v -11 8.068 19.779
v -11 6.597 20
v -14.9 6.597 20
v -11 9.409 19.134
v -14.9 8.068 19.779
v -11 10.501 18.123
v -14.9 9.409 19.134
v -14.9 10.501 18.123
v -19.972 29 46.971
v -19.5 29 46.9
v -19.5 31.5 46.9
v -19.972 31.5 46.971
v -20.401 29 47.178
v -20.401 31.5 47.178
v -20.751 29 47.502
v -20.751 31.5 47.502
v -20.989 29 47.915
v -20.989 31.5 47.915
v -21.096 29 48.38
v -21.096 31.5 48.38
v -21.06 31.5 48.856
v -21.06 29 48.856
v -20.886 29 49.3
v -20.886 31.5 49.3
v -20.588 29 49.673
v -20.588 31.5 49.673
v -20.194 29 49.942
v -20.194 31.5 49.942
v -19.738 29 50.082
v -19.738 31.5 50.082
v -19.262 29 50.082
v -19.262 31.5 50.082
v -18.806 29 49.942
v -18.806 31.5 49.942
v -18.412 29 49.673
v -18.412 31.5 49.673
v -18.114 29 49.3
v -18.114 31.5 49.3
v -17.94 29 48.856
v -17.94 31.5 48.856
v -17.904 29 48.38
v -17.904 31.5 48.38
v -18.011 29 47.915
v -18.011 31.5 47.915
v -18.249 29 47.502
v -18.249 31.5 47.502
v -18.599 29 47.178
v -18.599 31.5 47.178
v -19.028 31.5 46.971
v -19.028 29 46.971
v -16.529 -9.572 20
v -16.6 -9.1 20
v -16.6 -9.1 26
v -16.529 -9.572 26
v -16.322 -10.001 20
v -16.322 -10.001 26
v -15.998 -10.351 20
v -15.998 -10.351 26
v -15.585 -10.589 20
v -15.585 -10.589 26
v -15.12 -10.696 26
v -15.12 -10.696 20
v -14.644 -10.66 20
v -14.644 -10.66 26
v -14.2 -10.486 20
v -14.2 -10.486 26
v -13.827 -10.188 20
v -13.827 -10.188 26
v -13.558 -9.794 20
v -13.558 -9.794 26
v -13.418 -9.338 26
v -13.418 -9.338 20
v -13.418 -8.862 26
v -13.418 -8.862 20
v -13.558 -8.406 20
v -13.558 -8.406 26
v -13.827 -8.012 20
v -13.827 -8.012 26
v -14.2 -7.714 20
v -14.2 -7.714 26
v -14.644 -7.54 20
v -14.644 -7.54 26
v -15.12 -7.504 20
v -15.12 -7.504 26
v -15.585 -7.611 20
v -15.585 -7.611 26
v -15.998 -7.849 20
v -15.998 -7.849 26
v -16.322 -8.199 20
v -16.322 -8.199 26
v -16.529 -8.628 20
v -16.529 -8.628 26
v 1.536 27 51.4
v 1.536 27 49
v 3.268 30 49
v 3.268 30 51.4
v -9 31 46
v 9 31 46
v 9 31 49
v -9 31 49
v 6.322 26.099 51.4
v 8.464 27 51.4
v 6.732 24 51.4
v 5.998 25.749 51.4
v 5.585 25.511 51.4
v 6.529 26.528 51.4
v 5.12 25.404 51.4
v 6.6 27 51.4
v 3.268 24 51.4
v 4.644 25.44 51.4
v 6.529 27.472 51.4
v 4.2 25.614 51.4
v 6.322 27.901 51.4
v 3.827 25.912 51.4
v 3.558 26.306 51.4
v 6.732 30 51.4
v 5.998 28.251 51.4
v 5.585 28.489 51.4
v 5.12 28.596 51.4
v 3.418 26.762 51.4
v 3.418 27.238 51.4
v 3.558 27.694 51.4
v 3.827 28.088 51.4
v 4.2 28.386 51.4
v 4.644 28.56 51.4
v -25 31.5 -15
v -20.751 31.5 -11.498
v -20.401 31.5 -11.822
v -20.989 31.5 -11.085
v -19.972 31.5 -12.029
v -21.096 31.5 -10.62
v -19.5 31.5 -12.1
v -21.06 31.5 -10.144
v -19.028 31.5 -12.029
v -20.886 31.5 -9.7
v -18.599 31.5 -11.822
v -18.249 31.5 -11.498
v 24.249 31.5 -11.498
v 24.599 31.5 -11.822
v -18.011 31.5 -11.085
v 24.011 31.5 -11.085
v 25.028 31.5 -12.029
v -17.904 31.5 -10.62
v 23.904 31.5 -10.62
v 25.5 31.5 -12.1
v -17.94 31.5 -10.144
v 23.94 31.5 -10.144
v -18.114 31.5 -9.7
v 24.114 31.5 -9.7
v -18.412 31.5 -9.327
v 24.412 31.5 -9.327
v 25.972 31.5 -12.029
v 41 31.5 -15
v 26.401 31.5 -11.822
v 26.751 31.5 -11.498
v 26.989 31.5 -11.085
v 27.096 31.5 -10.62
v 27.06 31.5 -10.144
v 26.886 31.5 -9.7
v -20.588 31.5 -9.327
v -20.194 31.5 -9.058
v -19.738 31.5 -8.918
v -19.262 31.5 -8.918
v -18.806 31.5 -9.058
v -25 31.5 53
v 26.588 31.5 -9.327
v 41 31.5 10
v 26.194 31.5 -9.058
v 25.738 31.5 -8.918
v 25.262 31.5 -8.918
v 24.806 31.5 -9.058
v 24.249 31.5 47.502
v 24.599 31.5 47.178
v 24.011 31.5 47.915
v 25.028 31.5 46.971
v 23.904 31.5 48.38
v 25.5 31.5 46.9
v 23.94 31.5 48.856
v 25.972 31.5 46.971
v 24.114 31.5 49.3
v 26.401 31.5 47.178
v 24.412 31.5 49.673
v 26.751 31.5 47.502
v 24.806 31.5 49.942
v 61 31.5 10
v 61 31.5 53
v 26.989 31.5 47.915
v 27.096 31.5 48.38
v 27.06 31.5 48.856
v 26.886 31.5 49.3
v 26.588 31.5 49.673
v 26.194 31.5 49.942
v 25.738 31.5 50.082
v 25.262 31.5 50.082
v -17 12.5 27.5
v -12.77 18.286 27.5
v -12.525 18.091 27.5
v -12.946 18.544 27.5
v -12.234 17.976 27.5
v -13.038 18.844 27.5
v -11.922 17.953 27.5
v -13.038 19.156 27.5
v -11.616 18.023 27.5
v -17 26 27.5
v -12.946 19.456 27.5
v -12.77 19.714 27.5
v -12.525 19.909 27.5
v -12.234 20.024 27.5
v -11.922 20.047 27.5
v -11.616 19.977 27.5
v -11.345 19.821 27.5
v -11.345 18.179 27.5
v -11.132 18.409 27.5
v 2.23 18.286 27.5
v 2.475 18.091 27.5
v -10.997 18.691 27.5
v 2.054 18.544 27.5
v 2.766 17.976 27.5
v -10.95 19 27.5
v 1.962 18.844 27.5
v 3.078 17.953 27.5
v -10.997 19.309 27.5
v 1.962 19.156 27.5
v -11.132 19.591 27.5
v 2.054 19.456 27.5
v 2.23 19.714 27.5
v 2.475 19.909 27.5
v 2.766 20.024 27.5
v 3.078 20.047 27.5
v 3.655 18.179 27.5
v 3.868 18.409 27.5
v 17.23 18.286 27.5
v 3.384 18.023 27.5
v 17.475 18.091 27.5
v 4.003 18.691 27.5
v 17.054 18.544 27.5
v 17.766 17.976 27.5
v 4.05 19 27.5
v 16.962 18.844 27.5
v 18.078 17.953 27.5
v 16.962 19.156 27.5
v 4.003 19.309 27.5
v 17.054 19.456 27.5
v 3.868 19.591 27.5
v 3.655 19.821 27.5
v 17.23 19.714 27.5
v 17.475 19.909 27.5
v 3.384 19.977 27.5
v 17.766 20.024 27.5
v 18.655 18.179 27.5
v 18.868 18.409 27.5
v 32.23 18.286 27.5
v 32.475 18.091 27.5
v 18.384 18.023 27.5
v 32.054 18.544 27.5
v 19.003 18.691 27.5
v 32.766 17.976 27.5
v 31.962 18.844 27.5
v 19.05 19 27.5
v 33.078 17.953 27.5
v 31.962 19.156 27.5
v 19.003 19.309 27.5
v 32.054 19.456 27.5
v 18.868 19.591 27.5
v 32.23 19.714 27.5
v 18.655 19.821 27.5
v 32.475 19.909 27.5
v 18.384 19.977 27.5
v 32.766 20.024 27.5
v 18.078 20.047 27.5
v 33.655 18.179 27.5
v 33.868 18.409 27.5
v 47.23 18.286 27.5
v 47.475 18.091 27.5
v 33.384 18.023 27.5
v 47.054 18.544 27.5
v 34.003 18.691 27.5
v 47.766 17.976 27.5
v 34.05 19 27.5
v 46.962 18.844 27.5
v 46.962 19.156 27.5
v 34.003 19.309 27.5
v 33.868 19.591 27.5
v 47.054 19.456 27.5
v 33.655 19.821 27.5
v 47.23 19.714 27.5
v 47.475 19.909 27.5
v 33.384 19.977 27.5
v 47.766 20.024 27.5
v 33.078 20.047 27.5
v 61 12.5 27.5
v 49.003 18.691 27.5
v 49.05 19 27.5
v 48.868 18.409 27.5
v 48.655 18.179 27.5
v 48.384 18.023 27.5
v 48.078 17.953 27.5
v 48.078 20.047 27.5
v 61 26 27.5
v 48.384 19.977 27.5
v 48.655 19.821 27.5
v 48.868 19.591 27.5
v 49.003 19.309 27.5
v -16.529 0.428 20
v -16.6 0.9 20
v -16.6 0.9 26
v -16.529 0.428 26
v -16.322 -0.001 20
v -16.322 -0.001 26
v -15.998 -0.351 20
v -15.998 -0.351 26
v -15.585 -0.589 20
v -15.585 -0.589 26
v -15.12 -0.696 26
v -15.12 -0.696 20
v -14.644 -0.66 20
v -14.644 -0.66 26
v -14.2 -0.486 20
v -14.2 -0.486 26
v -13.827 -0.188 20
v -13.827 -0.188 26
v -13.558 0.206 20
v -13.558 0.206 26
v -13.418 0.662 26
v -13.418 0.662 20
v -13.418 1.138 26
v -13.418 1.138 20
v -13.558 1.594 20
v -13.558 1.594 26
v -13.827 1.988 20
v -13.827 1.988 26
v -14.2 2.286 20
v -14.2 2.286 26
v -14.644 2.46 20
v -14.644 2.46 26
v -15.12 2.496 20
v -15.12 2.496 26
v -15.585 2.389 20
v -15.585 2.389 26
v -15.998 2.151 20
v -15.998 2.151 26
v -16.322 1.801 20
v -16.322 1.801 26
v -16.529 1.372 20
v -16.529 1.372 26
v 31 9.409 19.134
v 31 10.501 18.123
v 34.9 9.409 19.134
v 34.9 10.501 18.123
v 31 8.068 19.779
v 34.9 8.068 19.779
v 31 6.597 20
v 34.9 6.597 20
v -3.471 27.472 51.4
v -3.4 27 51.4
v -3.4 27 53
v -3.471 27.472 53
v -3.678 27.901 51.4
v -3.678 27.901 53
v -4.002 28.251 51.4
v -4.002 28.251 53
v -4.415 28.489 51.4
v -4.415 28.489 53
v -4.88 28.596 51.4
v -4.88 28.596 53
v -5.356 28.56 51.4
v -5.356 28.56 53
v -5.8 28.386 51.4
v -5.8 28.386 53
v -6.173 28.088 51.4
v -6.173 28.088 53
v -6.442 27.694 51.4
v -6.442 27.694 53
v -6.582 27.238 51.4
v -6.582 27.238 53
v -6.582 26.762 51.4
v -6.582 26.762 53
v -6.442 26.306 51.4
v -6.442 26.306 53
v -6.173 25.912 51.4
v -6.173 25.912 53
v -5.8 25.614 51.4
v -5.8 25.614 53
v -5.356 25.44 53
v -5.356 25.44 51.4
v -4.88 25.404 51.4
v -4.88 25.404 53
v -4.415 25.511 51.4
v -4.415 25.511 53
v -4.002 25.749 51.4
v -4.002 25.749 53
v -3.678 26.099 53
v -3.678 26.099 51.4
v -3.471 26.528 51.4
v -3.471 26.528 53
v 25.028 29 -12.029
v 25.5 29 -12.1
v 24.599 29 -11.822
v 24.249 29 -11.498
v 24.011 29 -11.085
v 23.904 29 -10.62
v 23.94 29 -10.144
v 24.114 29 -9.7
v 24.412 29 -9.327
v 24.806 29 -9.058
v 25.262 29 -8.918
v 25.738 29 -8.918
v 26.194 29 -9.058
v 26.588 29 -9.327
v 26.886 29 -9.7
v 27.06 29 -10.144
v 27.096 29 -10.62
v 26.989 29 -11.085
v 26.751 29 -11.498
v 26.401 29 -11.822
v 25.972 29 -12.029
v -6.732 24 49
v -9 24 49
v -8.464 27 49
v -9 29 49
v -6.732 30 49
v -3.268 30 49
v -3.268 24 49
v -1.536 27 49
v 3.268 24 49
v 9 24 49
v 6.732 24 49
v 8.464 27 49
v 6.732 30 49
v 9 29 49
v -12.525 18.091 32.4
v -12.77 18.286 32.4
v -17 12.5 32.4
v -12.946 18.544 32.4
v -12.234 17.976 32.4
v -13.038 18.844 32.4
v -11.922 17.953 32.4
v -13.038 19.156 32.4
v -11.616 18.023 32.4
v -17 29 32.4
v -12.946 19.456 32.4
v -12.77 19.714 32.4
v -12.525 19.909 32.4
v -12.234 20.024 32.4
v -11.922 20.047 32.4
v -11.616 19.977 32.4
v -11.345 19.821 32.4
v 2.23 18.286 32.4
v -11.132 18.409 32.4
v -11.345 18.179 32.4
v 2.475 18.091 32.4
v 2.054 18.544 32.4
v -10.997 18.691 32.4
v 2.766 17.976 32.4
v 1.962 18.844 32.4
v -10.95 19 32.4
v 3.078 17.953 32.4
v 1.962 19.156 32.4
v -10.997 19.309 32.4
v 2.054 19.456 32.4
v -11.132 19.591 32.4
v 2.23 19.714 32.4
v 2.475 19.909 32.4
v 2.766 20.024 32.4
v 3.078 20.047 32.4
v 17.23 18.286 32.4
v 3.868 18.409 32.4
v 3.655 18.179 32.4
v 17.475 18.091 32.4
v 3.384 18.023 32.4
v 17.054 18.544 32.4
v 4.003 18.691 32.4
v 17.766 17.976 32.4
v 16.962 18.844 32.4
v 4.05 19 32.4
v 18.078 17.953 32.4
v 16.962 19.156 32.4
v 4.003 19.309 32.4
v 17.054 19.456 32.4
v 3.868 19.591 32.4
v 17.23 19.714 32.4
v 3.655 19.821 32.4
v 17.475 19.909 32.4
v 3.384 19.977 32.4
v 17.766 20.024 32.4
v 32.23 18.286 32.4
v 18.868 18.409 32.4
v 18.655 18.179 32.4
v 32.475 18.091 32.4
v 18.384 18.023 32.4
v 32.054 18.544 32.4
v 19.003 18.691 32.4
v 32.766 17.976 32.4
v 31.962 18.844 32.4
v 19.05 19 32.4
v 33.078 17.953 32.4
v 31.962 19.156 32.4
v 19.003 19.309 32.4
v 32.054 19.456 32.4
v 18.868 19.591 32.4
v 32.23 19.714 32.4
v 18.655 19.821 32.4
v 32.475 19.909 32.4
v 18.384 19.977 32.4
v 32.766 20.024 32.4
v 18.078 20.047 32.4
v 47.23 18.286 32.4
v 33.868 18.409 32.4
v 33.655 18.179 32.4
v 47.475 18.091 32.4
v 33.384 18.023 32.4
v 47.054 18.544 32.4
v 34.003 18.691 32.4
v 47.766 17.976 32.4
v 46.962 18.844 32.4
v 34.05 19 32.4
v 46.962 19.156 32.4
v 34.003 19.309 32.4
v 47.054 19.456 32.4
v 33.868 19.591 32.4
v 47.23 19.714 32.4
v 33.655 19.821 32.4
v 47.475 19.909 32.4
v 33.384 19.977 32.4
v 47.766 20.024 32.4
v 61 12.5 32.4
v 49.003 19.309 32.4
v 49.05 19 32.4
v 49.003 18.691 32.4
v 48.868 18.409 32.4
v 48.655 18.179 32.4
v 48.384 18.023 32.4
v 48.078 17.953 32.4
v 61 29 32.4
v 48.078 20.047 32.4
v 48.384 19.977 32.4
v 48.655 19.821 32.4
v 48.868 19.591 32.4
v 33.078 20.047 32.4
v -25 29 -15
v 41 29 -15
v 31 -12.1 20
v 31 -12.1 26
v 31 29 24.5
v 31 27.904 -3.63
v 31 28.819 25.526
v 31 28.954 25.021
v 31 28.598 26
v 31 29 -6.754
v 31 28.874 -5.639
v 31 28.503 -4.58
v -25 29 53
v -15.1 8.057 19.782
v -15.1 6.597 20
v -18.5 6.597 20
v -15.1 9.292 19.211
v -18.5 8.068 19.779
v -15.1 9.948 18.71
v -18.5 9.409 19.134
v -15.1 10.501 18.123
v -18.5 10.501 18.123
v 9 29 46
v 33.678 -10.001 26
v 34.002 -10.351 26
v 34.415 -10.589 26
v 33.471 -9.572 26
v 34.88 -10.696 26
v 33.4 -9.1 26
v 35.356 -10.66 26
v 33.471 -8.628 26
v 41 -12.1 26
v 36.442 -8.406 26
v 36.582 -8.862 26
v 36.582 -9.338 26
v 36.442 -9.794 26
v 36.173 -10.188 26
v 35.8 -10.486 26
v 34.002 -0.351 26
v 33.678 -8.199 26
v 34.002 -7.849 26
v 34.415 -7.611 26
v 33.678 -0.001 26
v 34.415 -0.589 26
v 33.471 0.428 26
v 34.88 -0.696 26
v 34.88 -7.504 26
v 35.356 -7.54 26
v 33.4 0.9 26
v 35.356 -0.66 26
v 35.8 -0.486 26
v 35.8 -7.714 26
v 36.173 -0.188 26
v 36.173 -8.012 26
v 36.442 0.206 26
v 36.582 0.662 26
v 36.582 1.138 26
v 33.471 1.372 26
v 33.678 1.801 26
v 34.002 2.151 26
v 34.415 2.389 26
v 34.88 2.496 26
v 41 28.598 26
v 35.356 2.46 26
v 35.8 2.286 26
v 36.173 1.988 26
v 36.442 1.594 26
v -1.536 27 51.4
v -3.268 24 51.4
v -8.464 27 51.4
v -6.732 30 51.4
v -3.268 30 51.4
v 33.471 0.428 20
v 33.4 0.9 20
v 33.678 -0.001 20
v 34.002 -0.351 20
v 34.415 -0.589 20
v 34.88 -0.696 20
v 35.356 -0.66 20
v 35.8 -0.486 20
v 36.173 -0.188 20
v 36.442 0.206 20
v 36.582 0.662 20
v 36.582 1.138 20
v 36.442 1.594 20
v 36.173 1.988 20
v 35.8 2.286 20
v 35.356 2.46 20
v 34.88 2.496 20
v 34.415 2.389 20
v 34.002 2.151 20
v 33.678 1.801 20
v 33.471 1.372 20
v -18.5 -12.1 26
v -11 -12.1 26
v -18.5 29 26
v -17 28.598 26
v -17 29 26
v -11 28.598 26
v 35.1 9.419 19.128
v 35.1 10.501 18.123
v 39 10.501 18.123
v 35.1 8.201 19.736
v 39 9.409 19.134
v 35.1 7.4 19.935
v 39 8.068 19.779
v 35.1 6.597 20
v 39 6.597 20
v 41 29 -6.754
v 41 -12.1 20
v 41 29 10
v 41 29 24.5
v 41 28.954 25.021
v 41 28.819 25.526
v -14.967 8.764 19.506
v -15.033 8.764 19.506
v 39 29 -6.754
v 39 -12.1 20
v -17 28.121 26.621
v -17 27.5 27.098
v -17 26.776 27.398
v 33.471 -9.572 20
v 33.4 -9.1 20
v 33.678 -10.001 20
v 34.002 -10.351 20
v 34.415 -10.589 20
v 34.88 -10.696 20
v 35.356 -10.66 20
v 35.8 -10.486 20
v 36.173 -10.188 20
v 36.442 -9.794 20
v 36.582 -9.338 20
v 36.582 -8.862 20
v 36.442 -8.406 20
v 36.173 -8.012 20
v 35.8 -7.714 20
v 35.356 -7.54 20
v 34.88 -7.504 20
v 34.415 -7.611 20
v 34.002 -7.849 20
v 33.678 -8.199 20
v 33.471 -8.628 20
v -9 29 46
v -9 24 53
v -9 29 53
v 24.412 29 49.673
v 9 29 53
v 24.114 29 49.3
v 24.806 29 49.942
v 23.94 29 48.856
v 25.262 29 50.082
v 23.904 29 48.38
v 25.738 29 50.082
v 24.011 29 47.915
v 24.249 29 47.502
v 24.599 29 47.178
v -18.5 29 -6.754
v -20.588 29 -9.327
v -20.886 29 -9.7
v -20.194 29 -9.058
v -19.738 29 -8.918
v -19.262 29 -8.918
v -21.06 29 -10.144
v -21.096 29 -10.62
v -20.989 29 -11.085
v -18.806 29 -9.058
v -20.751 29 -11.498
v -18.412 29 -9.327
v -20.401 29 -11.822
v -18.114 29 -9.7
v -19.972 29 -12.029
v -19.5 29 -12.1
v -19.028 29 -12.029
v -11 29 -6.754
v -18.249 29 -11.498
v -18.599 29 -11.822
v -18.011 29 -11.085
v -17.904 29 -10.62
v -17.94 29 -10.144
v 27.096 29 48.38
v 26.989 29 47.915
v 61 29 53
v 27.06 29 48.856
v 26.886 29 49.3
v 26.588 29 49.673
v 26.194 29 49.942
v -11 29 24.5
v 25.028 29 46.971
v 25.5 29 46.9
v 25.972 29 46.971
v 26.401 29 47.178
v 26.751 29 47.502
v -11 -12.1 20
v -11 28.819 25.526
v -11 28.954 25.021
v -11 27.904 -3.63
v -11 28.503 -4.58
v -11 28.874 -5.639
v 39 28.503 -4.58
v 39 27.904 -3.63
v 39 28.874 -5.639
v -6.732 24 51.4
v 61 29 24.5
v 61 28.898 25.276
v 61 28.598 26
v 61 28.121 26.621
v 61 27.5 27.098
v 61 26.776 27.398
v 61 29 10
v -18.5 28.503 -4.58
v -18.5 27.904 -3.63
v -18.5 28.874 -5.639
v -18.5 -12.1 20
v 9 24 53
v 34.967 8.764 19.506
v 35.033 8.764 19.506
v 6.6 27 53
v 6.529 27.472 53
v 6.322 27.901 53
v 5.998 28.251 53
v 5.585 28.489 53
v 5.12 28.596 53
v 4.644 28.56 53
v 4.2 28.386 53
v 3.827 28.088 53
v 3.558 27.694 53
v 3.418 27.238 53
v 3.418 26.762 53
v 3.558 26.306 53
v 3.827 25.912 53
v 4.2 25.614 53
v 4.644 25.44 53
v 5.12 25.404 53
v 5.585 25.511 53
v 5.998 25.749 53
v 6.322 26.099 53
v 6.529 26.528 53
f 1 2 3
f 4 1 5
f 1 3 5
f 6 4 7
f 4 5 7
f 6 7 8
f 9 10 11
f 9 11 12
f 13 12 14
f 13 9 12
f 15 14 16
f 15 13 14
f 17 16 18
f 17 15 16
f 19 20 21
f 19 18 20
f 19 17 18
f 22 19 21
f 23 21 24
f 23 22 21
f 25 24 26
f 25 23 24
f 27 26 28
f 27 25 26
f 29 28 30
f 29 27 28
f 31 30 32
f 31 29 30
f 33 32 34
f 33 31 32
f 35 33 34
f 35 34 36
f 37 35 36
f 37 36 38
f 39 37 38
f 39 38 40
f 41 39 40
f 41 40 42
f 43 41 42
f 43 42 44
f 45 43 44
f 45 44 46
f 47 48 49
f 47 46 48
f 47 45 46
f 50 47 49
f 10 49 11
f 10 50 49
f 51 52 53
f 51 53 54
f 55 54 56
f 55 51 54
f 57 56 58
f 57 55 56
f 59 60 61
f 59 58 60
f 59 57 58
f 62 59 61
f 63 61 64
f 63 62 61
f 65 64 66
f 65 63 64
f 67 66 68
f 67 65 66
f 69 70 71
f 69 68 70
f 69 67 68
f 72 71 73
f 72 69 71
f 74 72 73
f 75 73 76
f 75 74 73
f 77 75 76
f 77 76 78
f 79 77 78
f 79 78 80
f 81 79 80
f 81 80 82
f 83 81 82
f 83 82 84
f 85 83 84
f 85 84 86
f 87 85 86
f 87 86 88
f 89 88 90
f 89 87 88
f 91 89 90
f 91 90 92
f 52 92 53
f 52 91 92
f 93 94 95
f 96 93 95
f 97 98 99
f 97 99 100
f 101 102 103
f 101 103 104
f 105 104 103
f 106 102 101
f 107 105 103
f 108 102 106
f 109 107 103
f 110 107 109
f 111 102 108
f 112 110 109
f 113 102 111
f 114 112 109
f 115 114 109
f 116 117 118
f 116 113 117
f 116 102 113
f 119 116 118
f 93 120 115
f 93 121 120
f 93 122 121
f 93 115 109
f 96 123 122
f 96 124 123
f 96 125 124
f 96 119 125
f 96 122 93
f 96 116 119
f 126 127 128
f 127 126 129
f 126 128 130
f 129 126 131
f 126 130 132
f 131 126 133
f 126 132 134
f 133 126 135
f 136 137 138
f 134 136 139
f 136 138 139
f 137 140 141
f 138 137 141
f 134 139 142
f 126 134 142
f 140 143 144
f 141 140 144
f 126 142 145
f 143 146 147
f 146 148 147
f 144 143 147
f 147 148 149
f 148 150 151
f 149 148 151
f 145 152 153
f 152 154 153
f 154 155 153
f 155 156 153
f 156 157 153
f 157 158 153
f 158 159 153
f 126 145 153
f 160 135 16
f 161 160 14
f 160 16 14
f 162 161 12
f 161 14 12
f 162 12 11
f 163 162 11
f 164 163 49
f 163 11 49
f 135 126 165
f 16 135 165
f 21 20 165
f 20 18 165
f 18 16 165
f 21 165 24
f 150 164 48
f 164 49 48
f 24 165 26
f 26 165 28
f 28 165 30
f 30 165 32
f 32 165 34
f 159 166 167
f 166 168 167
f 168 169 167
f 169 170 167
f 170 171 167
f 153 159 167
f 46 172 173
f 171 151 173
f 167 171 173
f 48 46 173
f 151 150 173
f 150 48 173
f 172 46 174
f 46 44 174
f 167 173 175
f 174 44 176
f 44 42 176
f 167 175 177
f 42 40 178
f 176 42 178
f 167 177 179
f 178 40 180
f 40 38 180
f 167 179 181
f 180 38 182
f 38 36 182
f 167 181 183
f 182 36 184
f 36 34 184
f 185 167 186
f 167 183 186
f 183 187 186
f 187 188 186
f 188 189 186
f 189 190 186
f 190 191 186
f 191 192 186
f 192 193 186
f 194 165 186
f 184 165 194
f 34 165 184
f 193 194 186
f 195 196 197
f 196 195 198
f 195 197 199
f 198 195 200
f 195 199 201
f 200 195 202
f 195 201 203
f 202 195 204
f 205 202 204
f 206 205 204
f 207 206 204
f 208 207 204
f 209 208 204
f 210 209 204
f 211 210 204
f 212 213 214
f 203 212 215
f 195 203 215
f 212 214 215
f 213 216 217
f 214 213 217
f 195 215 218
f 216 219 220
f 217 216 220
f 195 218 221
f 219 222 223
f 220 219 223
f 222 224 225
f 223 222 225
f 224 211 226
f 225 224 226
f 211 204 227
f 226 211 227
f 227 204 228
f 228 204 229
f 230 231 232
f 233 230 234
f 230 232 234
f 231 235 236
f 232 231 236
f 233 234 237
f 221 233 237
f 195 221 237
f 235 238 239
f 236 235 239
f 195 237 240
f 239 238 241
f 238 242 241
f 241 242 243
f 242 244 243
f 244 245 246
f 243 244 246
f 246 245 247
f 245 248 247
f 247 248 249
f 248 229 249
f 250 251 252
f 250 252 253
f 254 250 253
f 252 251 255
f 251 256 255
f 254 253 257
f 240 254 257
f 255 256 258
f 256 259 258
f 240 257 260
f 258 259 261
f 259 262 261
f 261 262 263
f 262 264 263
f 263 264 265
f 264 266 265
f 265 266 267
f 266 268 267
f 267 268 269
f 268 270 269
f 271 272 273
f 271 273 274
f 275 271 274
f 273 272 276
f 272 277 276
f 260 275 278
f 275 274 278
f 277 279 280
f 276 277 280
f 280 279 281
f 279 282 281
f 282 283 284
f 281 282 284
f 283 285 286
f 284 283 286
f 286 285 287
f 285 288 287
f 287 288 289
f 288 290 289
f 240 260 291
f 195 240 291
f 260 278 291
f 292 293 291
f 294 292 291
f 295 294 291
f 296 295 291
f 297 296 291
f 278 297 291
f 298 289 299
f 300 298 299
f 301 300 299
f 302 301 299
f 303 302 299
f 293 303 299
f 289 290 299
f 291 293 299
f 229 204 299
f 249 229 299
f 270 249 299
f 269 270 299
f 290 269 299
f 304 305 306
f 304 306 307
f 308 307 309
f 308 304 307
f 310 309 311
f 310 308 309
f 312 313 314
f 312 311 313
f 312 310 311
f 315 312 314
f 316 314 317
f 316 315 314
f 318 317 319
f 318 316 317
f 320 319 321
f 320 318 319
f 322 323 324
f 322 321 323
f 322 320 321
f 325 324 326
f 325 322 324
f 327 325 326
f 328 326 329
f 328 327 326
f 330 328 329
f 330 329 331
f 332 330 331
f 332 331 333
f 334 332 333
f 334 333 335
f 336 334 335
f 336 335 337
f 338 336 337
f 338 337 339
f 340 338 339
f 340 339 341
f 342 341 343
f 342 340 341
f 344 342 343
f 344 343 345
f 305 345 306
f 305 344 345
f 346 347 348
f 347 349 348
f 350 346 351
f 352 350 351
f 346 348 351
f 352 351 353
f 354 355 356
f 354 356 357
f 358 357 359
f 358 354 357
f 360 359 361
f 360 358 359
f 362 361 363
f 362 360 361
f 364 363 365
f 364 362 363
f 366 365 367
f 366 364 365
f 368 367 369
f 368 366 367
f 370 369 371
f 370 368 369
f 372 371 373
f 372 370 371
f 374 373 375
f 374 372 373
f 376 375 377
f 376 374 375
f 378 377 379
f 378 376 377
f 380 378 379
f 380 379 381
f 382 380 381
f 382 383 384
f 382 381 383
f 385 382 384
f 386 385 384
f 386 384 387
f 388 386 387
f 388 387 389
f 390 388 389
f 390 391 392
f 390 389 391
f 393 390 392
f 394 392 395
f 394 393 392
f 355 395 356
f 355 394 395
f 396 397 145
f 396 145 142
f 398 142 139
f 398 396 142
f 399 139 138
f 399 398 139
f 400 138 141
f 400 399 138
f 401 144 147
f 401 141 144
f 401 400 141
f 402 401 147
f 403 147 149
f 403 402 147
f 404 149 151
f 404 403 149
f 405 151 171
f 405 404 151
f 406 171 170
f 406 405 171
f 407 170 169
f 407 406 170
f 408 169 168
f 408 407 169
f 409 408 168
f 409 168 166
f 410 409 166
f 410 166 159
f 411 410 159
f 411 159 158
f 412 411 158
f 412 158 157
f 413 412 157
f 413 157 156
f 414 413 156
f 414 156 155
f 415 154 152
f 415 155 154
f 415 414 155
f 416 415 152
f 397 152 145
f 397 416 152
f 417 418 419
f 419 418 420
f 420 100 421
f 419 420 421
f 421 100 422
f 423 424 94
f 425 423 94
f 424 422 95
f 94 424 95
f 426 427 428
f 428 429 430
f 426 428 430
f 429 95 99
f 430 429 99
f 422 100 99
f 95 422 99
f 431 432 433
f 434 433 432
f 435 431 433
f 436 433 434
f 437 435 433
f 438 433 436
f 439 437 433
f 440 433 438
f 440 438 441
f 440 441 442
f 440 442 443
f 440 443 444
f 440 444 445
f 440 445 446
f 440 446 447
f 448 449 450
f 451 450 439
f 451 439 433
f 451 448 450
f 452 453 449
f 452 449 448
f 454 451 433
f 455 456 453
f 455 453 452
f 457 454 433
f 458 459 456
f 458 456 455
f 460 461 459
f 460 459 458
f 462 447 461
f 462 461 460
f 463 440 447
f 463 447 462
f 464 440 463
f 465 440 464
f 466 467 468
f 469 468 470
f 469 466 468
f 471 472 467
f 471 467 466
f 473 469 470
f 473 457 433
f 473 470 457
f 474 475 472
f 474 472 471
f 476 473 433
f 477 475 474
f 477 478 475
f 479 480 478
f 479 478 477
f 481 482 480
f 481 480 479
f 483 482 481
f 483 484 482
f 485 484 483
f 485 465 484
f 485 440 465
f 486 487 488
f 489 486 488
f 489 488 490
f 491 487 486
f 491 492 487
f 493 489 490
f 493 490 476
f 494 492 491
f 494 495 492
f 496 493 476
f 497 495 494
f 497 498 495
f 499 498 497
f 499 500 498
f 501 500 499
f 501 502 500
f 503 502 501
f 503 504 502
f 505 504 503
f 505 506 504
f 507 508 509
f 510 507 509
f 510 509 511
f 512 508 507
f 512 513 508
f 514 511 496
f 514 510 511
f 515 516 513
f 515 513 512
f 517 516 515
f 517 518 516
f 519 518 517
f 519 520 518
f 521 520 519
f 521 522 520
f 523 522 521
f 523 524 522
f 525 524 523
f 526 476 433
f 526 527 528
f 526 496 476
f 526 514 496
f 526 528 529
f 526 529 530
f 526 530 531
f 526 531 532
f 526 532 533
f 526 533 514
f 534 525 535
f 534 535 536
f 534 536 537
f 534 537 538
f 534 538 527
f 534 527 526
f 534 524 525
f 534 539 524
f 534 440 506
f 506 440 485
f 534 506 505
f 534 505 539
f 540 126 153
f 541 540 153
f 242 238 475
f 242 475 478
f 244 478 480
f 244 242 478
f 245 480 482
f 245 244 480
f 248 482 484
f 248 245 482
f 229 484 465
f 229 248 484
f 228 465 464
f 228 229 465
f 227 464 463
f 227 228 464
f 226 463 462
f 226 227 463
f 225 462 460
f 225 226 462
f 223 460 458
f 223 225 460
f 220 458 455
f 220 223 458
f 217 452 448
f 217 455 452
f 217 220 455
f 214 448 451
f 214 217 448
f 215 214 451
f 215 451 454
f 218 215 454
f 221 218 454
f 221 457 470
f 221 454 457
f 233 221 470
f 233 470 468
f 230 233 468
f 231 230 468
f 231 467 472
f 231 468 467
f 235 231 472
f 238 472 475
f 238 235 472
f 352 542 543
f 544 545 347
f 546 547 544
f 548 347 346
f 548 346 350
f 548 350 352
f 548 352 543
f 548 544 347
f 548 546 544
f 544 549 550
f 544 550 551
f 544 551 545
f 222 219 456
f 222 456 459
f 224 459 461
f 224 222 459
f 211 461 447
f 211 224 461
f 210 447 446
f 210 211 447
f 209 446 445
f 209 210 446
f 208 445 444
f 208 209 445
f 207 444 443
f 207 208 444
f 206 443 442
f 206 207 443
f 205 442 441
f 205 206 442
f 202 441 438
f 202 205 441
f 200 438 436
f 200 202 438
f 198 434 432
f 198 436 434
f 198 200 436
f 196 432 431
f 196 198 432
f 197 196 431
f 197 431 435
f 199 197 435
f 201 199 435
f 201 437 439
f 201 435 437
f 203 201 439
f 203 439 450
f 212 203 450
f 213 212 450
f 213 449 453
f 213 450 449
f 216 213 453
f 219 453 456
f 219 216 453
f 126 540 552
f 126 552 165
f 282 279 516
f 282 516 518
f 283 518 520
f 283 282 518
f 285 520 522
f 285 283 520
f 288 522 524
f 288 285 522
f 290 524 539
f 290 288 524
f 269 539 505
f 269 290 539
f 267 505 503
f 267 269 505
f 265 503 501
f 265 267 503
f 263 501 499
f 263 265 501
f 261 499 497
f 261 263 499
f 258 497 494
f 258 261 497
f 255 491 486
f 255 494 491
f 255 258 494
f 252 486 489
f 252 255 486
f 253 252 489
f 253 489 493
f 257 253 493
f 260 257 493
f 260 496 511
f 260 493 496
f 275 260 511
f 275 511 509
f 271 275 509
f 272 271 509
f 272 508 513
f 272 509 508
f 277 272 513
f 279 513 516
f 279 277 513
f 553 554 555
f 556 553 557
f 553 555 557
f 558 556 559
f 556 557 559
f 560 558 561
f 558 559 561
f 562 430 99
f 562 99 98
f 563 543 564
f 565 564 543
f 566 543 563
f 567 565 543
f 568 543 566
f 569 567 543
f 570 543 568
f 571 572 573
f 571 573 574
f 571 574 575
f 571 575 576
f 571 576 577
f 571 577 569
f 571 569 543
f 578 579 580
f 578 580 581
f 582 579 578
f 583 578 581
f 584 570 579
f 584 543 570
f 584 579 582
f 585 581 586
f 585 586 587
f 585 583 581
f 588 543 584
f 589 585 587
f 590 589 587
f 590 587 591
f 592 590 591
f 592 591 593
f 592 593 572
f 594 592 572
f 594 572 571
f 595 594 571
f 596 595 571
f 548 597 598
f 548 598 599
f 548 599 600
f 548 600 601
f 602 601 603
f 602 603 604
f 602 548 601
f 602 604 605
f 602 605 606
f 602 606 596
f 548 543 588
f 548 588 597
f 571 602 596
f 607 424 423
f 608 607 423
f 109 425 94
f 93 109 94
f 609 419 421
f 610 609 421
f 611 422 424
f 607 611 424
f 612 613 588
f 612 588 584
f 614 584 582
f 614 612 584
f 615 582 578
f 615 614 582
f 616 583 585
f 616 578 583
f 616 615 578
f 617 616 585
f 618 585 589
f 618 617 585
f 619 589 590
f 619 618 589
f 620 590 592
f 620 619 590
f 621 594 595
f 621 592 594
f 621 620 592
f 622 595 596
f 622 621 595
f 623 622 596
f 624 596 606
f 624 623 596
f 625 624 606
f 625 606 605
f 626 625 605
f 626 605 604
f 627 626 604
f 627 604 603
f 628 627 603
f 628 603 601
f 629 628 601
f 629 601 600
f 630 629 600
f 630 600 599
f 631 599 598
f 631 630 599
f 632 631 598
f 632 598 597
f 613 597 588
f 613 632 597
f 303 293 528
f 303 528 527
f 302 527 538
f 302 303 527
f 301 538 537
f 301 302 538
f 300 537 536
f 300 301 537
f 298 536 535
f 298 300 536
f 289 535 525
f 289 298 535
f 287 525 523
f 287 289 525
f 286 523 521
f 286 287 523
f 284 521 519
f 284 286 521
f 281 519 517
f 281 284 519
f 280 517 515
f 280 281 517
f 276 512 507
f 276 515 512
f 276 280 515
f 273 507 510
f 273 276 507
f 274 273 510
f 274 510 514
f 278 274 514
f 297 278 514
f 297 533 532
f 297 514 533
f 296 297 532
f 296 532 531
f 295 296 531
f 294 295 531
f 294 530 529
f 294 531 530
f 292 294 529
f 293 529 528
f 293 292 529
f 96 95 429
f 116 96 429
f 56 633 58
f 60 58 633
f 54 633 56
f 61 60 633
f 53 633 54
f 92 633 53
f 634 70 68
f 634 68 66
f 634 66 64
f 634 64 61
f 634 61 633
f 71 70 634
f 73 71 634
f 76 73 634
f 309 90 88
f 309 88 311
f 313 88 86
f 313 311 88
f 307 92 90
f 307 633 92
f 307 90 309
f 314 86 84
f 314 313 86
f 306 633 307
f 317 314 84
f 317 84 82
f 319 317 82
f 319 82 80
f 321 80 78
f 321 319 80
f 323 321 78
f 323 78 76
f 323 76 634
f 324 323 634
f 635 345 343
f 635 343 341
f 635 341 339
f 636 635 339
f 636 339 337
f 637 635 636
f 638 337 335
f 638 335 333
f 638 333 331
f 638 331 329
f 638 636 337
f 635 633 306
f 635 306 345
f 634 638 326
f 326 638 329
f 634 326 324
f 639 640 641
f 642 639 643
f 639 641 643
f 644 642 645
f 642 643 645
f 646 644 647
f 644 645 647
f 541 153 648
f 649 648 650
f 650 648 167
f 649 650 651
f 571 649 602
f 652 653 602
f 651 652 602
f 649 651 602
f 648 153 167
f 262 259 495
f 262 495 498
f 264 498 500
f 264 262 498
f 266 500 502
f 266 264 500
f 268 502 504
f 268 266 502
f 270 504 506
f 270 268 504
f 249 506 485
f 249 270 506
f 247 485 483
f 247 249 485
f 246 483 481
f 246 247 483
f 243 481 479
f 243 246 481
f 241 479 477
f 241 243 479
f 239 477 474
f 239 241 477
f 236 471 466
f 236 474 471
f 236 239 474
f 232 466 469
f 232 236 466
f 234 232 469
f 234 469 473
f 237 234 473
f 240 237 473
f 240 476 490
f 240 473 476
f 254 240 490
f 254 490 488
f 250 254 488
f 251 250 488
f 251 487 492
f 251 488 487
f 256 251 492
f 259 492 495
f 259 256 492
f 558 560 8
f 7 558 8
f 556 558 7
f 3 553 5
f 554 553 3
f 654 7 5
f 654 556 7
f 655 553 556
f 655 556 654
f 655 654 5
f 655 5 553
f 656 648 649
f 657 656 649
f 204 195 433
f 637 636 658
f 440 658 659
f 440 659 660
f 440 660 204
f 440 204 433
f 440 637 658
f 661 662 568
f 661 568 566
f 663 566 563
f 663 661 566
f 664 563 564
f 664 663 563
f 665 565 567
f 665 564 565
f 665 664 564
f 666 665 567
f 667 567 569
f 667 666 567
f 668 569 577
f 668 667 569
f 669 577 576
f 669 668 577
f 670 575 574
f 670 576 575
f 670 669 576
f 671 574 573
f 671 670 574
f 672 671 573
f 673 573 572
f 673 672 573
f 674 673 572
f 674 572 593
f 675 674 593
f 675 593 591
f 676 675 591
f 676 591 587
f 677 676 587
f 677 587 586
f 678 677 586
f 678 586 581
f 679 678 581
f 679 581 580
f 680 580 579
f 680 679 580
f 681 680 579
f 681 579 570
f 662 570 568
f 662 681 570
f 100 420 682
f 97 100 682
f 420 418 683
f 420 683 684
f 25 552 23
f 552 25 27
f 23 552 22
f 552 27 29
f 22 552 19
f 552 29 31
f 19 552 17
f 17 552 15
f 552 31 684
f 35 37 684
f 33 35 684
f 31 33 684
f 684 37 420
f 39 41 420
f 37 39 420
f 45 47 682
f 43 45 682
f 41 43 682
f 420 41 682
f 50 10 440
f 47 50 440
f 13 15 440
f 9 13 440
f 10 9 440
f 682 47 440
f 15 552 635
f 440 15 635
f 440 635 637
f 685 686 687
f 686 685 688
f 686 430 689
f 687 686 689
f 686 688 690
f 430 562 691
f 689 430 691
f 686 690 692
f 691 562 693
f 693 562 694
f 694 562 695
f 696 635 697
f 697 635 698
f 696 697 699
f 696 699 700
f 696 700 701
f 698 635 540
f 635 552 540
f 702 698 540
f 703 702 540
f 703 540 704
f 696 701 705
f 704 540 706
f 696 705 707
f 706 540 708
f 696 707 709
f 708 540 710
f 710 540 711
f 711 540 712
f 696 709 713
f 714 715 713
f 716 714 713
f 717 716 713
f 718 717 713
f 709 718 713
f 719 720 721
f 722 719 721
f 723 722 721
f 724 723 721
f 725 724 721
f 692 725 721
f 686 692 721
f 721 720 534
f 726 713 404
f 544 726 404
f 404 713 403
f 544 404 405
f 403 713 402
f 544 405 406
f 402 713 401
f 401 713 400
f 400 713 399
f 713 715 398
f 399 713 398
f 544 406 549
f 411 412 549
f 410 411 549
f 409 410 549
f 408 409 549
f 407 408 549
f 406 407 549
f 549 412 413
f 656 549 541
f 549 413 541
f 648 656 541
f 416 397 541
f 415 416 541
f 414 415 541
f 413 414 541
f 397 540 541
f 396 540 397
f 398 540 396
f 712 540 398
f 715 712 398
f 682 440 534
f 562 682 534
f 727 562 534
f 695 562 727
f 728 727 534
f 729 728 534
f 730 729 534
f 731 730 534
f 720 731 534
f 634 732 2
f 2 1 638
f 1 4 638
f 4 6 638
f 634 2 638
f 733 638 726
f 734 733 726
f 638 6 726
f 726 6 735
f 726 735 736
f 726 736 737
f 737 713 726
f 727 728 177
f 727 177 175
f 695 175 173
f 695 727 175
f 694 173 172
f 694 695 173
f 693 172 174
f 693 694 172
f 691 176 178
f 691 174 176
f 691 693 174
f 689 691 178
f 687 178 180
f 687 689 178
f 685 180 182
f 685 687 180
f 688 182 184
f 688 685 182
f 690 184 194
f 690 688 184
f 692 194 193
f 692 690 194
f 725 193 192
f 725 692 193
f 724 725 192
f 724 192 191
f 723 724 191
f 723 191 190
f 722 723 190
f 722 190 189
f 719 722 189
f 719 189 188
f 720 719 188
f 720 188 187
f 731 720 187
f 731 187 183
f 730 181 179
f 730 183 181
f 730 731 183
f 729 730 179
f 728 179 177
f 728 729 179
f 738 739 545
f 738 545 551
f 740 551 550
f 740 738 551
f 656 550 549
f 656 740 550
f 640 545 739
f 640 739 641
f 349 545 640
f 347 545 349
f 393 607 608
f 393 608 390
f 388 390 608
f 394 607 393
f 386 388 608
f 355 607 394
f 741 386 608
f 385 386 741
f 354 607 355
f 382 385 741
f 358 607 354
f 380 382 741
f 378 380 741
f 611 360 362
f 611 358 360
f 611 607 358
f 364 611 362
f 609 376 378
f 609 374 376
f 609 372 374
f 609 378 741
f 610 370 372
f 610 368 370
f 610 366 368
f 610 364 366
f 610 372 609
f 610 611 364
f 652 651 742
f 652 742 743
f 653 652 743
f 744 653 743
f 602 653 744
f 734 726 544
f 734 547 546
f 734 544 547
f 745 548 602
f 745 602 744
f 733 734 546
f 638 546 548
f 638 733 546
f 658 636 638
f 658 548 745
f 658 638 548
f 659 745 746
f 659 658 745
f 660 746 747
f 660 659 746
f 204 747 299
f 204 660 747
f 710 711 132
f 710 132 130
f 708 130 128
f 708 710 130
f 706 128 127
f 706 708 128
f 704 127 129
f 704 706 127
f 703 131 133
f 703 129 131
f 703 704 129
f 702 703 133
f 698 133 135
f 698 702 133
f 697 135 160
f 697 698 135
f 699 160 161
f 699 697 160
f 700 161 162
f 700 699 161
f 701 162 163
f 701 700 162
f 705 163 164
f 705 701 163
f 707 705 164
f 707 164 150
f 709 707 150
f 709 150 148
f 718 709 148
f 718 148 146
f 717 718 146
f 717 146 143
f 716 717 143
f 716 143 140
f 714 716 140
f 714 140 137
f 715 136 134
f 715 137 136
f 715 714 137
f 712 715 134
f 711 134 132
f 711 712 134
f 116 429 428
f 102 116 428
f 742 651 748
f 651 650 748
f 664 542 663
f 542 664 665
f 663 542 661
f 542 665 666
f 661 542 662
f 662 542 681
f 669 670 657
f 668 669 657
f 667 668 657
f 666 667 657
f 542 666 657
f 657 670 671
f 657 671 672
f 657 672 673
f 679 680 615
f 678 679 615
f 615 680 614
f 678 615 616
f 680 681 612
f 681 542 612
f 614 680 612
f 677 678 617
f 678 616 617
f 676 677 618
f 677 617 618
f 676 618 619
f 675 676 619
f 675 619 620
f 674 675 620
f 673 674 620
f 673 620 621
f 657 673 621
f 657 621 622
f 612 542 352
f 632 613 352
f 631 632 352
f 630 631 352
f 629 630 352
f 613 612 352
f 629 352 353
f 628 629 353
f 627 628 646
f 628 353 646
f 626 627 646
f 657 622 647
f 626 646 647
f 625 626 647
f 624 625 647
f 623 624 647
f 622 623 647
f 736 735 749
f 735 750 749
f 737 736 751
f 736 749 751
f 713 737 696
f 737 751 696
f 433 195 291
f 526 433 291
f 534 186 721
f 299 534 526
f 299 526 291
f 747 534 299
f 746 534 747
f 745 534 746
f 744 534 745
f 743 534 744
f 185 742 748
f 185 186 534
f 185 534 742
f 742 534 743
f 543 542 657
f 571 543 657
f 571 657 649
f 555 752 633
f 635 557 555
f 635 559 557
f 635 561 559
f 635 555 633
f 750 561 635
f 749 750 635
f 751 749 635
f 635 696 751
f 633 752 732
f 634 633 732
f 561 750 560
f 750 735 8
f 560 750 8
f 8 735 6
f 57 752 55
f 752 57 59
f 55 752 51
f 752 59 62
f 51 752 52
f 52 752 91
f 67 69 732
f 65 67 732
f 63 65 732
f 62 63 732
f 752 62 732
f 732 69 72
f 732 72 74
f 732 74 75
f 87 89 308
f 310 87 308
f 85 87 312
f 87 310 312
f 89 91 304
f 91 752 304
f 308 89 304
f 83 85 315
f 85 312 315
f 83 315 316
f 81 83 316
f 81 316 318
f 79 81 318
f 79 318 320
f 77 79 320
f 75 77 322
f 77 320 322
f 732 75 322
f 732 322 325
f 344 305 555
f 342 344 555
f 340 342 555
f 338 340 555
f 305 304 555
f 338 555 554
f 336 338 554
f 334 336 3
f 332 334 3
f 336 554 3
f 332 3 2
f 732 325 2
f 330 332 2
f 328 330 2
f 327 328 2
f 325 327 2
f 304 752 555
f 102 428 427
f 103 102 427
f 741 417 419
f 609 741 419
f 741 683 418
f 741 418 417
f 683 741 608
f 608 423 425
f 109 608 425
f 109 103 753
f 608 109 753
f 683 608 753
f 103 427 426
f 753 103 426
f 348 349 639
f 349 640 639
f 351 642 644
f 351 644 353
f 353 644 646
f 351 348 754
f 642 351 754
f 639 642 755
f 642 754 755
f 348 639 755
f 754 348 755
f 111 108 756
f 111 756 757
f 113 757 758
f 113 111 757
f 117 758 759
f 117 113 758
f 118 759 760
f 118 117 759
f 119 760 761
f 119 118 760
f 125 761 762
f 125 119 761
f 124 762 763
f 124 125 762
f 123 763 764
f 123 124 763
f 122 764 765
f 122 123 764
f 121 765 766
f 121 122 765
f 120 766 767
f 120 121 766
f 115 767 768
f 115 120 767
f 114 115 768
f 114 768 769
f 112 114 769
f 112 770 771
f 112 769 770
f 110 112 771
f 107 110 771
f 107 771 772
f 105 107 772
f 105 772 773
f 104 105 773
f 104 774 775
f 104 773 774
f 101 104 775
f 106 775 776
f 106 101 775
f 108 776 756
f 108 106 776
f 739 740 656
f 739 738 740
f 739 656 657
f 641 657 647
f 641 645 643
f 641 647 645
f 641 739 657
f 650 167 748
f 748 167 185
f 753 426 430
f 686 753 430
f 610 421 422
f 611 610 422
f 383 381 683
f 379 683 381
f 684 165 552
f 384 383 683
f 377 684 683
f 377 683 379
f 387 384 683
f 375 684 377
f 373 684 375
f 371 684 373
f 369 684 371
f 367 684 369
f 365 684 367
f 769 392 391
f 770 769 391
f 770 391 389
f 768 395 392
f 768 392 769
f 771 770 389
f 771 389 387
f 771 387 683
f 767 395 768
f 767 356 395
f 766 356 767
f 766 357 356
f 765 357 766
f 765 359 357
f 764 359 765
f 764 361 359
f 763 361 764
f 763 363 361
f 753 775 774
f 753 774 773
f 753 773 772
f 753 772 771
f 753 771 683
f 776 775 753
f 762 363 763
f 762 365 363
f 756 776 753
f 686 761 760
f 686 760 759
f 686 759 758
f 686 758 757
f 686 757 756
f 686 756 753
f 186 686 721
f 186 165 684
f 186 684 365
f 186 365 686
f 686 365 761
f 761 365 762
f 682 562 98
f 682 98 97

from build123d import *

# Parameters (mm, degrees)
ORTHOGONAL_START                              = -15
ORTHOGONAL_CHASSIS_PLATE_PRIMARY_PROFILE_W    = 66
ORTHOGONAL_CHASSIS_PLATE_PRIMARY_PROFILE_H    = 4
ORTHOGONAL_CHASSIS_PLATE_PRIMARY_DEPTH        = 25.1
ORTHOGONAL_START_2                            = 10
ORTHOGONAL_CHASSIS_PLATE_GUIDE_SIDE_PROF_W    = 109
ORTHOGONAL_CHASSIS_PLATE_GUIDE_SIDE_PROF_H    = 4
ORTHOGONAL_CHASSIS_PLATE_GUIDE_SIDE_DEPTH     = 43
HORIZONTAL_START                              = 20
HORIZONTAL_SERVO_SEAT_UPRIGHTS_PROFILE_W      = 7.5
HORIZONTAL_SERVO_SEAT_UPRIGHTS_PROFILE_H      = 37.1
HORIZONTAL_SERVO_SEAT_UPRIGHTS_PROFILE_W_2    = 10
HORIZONTAL_SERVO_SEAT_UPRIGHTS_DEPTH          = 6
SIDE_START                                    = 27.5
SIDE_MOUNTING_FACE_FOR_MGN7_RAIL_PROFILE_W    = 100
SIDE_MOUNTING_FACE_FOR_MGN7_RAIL_PROFILE_H    = 16.6
SIDE_MOUNTING_FACE_FOR_MGN7_RAIL_DEPTH        = 4.9
HORIZONTAL_START_2                            = 49
HORIZONTAL_LIMIT_BRACKET_FOOT_SUPPORT_PR_W    = 18
HORIZONTAL_LIMIT_BRACKET_FOOT_SUPPORT_PR_H    = 5.1
HORIZONTAL_LIMIT_BRACKET_FOOT_SUPPORT_DEPTH   = 4
CHASSIS_START                                 = 28.9
CHASSIS_MOUNTING_HOLE_LAYOUT_45_X_41_2_R      = 1.6
CHASSIS_MOUNTING_HOLE_LAYOUT_45_X_41_MM_DEPTH = 4.2
SERVO_START                                   = 19.9
SERVO_MOUNT_50_X_10_MM_PITCH_PROFILE_R        = 1.6
SERVO_MOUNT_50_X_10_MM_PITCH_DEPTH            = 6.2
GUIDE_START                                   = 27.45
GUIDE_M2_MOUNTING_PILOTS_15_MM_PITCH_PRO_R    = 1.05
GUIDE_M2_MOUNTING_PILOTS_15_MM_PITCH_DEPTH    = 5.05
STOP_START                                    = 48.9
STOP_MOUNTING_TWO_M3_PILOTS_10_MM_PI_2_R      = 1.6
STOP_MOUNTING_TWO_M3_PILOTS_10_MM_PITCH_DEPTH = 4.2
FILLET_2_R                                    = 3
SKETCH_3_W                                    = 18
SKETCH_3_H                                    = 3
CUT_EXTRUDE_1_DEPTH                           = 2
CUT_EXTRUDE_2_DEPTH                           = 2.4
EXTRUDE_3_DEPTH                               = 7.5
EXTRUDE_4_DEPTH                               = 10
FILLET_3_R                                    = 5
SKETCH_7_W                                    = 109
SKETCH_7_H                                    = 1.5
CUT_EXTRUDE_3_DEPTH                           = 80
SKETCH_8_W                                    = 23
SKETCH_8_H                                    = 43
CUT_EXTRUDE_4_DEPTH                           = 30
RAISE_START                                   = 20
RAISE_SERVO_MOUNTING_TABS_BY_4_10_MM_PRO_W    = 7.5
RAISE_SERVO_MOUNTING_TABS_BY_4_10_MM_PRO_H    = 5.1
RAISE_SERVO_MOUNTING_TABS_BY_4_10_MM_PRO_W_2  = 10
RAISE_SERVO_MOUNTING_TABS_BY_4_10_MM_DEPTH    = 6
FILL_START                                    = 20
FILL_ORIGINAL_SERVO_HOLES_PROFILE_R           = 1.65
FILL_ORIGINAL_SERVO_HOLES_DEPTH               = 6
SERVO_MOUNTING_HOLES_RAISED_4_10_MM_PROF_R    = 1.6
SERVO_MOUNTING_HOLES_RAISED_4_10_MM_DEPTH     = 6.2
EXTRUDE_5_DEPTH                               = 2


with BuildPart() as part:
    # Orthogonal chassis plate primary profile → Orthogonal chassis plate primary (new body)
    with BuildSketch(Plane.XY.offset(ORTHOGONAL_START)):
        with Locations((8, 31)):
            Rectangle(ORTHOGONAL_CHASSIS_PLATE_PRIMARY_PROFILE_W, ORTHOGONAL_CHASSIS_PLATE_PRIMARY_PROFILE_H)
    extrude(amount=ORTHOGONAL_CHASSIS_PLATE_PRIMARY_DEPTH)

    # Orthogonal chassis plate guide side profile → Orthogonal chassis plate guide side (add)
    with BuildSketch(Plane.XY.offset(ORTHOGONAL_START_2)):
        with Locations((29.5, 31)):
            Rectangle(ORTHOGONAL_CHASSIS_PLATE_GUIDE_SIDE_PROF_W, ORTHOGONAL_CHASSIS_PLATE_GUIDE_SIDE_PROF_H)
    extrude(amount=ORTHOGONAL_CHASSIS_PLATE_GUIDE_SIDE_DEPTH)

    # Horizontal servo seat uprights profile → Horizontal servo seat uprights (add)
    with BuildSketch(Plane.XY.offset(HORIZONTAL_START)):
        with Locations((-14.75, 10.55)):
            Rectangle(HORIZONTAL_SERVO_SEAT_UPRIGHTS_PROFILE_W, HORIZONTAL_SERVO_SEAT_UPRIGHTS_PROFILE_H)
        with Locations((36, 10.55)):
            Rectangle(HORIZONTAL_SERVO_SEAT_UPRIGHTS_PROFILE_W_2, HORIZONTAL_SERVO_SEAT_UPRIGHTS_PROFILE_H)
    extrude(amount=HORIZONTAL_SERVO_SEAT_UPRIGHTS_DEPTH)

    # Side mounting face for MGN7 rail profile → Side mounting face for MGN7 rail (add)
    with BuildSketch(Plane.XY.offset(SIDE_START)):
        with Locations((33, 20.8)):
            Rectangle(SIDE_MOUNTING_FACE_FOR_MGN7_RAIL_PROFILE_W, SIDE_MOUNTING_FACE_FOR_MGN7_RAIL_PROFILE_H)
    extrude(amount=SIDE_MOUNTING_FACE_FOR_MGN7_RAIL_DEPTH)

    # Horizontal limit bracket foot support profile → Horizontal limit bracket foot support (add)
    with BuildSketch(Plane.XY.offset(HORIZONTAL_START_2)):
        with Locations((0, 26.55)):
            Rectangle(HORIZONTAL_LIMIT_BRACKET_FOOT_SUPPORT_PR_W, HORIZONTAL_LIMIT_BRACKET_FOOT_SUPPORT_PR_H)
    extrude(amount=HORIZONTAL_LIMIT_BRACKET_FOOT_SUPPORT_DEPTH)

    # Chassis mounting hole layout 45 x 41 2 → Chassis mounting hole layout 45 x 41 mm (cut)
    with BuildSketch(Plane(origin=(0, 0, 0), x_dir=(1, 0, 0), z_dir=(0, 1, 0)).offset(CHASSIS_START)):
        with Locations(Location((-19.5, 10.5, 0), (0, 0, 90))):
            Circle(CHASSIS_MOUNTING_HOLE_LAYOUT_45_X_41_2_R)
        with Locations(Location((-19.5, -48.5, 0), (0, 0, 90))):
            Circle(CHASSIS_MOUNTING_HOLE_LAYOUT_45_X_41_2_R)
        with Locations(Location((25.5, 10.5, 0), (0, 0, 90))):
            Circle(CHASSIS_MOUNTING_HOLE_LAYOUT_45_X_41_2_R)
        with Locations(Location((25.5, -48.5, 0), (0, 0, 90))):
            Circle(CHASSIS_MOUNTING_HOLE_LAYOUT_45_X_41_2_R)
        with Locations(Location((70.5, -48.5, 0), (0, 0, 90))):
            Circle(CHASSIS_MOUNTING_HOLE_LAYOUT_45_X_41_2_R)
    extrude(amount=CHASSIS_MOUNTING_HOLE_LAYOUT_45_X_41_MM_DEPTH, mode=Mode.SUBTRACT)

    # Servo mount 50 x 10 mm pitch profile → Servo mount 50 x 10 mm pitch (cut)
    with BuildSketch(Plane.XY.offset(SERVO_START)):
        with Locations(Location((-15, -5, 0), (0, 0, 180))):
            Circle(SERVO_MOUNT_50_X_10_MM_PITCH_PROFILE_R)
        with Locations(Location((-15, 5, 0), (0, 0, 180))):
            Circle(SERVO_MOUNT_50_X_10_MM_PITCH_PROFILE_R)
        with Locations(Location((35, -5, 0), (0, 0, 180))):
            Circle(SERVO_MOUNT_50_X_10_MM_PITCH_PROFILE_R)
        with Locations(Location((35, 5, 0), (0, 0, 180))):
            Circle(SERVO_MOUNT_50_X_10_MM_PITCH_PROFILE_R)
    extrude(amount=SERVO_MOUNT_50_X_10_MM_PITCH_DEPTH, mode=Mode.SUBTRACT)

    # Guide M2 mounting pilots 15 mm pitch profile → Guide M2 mounting pilots 15 mm pitch (cut)
    with BuildSketch(Plane.XY.offset(GUIDE_START)):
        with Locations((-12, 19)):
            Circle(GUIDE_M2_MOUNTING_PILOTS_15_MM_PITCH_PRO_R)
        with Locations((3, 19)):
            Circle(GUIDE_M2_MOUNTING_PILOTS_15_MM_PITCH_PRO_R)
        with Locations((18, 19)):
            Circle(GUIDE_M2_MOUNTING_PILOTS_15_MM_PITCH_PRO_R)
        with Locations((33, 19)):
            Circle(GUIDE_M2_MOUNTING_PILOTS_15_MM_PITCH_PRO_R)
        with Locations((48, 19)):
            Circle(GUIDE_M2_MOUNTING_PILOTS_15_MM_PITCH_PRO_R)
        with Locations((63, 19)):
            Circle(GUIDE_M2_MOUNTING_PILOTS_15_MM_PITCH_PRO_R)
        with Locations((78, 19)):
            Circle(GUIDE_M2_MOUNTING_PILOTS_15_MM_PITCH_PRO_R)
    extrude(amount=GUIDE_M2_MOUNTING_PILOTS_15_MM_PITCH_DEPTH, mode=Mode.SUBTRACT)

    # Stop mounting two M3 pilots 10 mm pi 2 → Stop mounting two M3 pilots 10 mm pitch (cut)
    with BuildSketch(Plane.XY.offset(STOP_START)):
        with Locations((-5, 27)):
            Circle(STOP_MOUNTING_TWO_M3_PILOTS_10_MM_PI_2_R)
        with Locations((5, 27)):
            Circle(STOP_MOUNTING_TWO_M3_PILOTS_10_MM_PI_2_R)
    extrude(amount=STOP_MOUNTING_TWO_M3_PILOTS_10_MM_PITCH_DEPTH, mode=Mode.SUBTRACT)

    # 圆角2
    # the kernel refuses this fillet: 3 mm, written as the material it adds along each edge
    with BuildSketch(Plane(origin=(-17, 29, 27.5), x_dir=(0, 0, -1), z_dir=(1, 0, 0))) as fillet_2_piece_1:
        with BuildLine():
            CenterArc((FILLET_2_R, -FILLET_2_R), FILLET_2_R, 90, 90)
            Line((0, -FILLET_2_R), (0, 0))
            Line((0, 0), (FILLET_2_R, 0))
        make_face()
    extrude(amount=100)

    # 草图3 → 切除-拉伸1 (cut)
    with BuildSketch(Plane(origin=(0, 29, 0), x_dir=(-1, 0, 0), z_dir=(0, -1, 0))):
        with Locations((0, -47.5)):
            Rectangle(SKETCH_3_W, SKETCH_3_H)
    extrude(amount=-CUT_EXTRUDE_1_DEPTH, mode=Mode.SUBTRACT)

    # 草图4 → 切除-拉伸2 (cut)
    with BuildSketch(Plane(origin=(0, 0, 49), x_dir=(-1, 0, 0), z_dir=(0, 0, -1))):
        Polygon((-3.267949192, 30), (-6.732050808, 30), (-8.464101615, 27), (-6.732050808, 24), (-3.267949192, 24), (-1.535898385, 27), align=None)
        Polygon((6.732050808, 30), (3.267949192, 30), (1.535898385, 27), (3.267949192, 24), (6.732050808, 24), (8.464101615, 27), align=None)
    extrude(amount=-CUT_EXTRUDE_2_DEPTH, mode=Mode.SUBTRACT)

    # 草图5 → 凸台-拉伸3 (add)
    with BuildSketch(Plane(origin=(-11, 0, 0), x_dir=(0, 0, -1), z_dir=(1, 0, 0))):
        Polygon((-20, 29), (5, 29), (-20, 9), align=None)
    extrude(amount=-EXTRUDE_3_DEPTH)

    # 草图6 → 凸台-拉伸4 (add)
    with BuildSketch(Plane.ZY.offset(-31)):
        Polygon((20, 29), (-5, 29), (20, 9), align=None)
    extrude(amount=-EXTRUDE_4_DEPTH)

    # 圆角3
    fillet_3_edges = [part.edges().sort_by_distance(p)[0] for p in [
        (-14.75, 9, 20),
        (-14.75, 29, -5),
        (36, 9, 20),
        (36, 29, -5),
    ]]
    fillet(fillet_3_edges, radius=FILLET_3_R)

    # 草图7 → 切除-拉伸3 (cut)
    with BuildSketch(Plane.XY.offset(53)):
        with Locations((29.5, 32.25)):
            Rectangle(SKETCH_7_W, SKETCH_7_H)
    extrude(amount=-CUT_EXTRUDE_3_DEPTH, mode=Mode.SUBTRACT)

    # 草图8 → 切除-拉伸4 (cut)
    with BuildSketch(Plane(origin=(0, 31.5, 0), x_dir=(1, 0, 0), z_dir=(0, 1, 0))):
        with Locations((72.5, -31.5)):
            Rectangle(SKETCH_8_W, SKETCH_8_H)
    extrude(amount=-CUT_EXTRUDE_4_DEPTH, mode=Mode.SUBTRACT)

    # Raise servo mounting tabs by 4.10 mm profile → Raise servo mounting tabs by 4.10 mm (add)
    with BuildSketch(Plane.XY.offset(RAISE_START)):
        with Locations((-14.75, -9.55)):
            Rectangle(RAISE_SERVO_MOUNTING_TABS_BY_4_10_MM_PRO_W, RAISE_SERVO_MOUNTING_TABS_BY_4_10_MM_PRO_H)
        with Locations((36, -9.55)):
            Rectangle(RAISE_SERVO_MOUNTING_TABS_BY_4_10_MM_PRO_W_2, RAISE_SERVO_MOUNTING_TABS_BY_4_10_MM_PRO_H)
    extrude(amount=RAISE_SERVO_MOUNTING_TABS_BY_4_10_MM_DEPTH)

    # Fill original servo holes profile → Fill original servo holes (add)
    with BuildSketch(Plane.XY.offset(FILL_START)):
        with Locations((-15, -5)):
            Circle(FILL_ORIGINAL_SERVO_HOLES_PROFILE_R)
        with Locations((-15, 5)):
            Circle(FILL_ORIGINAL_SERVO_HOLES_PROFILE_R)
        with Locations((35, -5)):
            Circle(FILL_ORIGINAL_SERVO_HOLES_PROFILE_R)
        with Locations((35, 5)):
            Circle(FILL_ORIGINAL_SERVO_HOLES_PROFILE_R)
    extrude(amount=FILL_ORIGINAL_SERVO_HOLES_DEPTH)

    # Servo mounting holes raised 4.10 mm profile → Servo mounting holes raised 4.10 mm (cut)
    with BuildSketch(Plane.XY.offset(SERVO_START)):
        with Locations(Location((-15, -9.1, 0), (0, 0, 180))):
            Circle(SERVO_MOUNTING_HOLES_RAISED_4_10_MM_PROF_R)
        with Locations(Location((-15, 0.9, 0), (0, 0, 180))):
            Circle(SERVO_MOUNTING_HOLES_RAISED_4_10_MM_PROF_R)
        with Locations(Location((35, -9.1, 0), (0, 0, 180))):
            Circle(SERVO_MOUNTING_HOLES_RAISED_4_10_MM_PROF_R)
        with Locations(Location((35, 0.9, 0), (0, 0, 180))):
            Circle(SERVO_MOUNTING_HOLES_RAISED_4_10_MM_PROF_R)
    extrude(amount=SERVO_MOUNTING_HOLES_RAISED_4_10_MM_DEPTH, mode=Mode.SUBTRACT)

    # 草图9 → 凸台-拉伸5 (add)
    with BuildSketch(Plane(origin=(41, 0, 0), x_dir=(0, 0, -1), z_dir=(1, 0, 0))):
        Polygon((-24.5, 29), (6.753905297, 29), (-20, -12.1), align=None)
    extrude(amount=-EXTRUDE_5_DEPTH)


solid = part.part
